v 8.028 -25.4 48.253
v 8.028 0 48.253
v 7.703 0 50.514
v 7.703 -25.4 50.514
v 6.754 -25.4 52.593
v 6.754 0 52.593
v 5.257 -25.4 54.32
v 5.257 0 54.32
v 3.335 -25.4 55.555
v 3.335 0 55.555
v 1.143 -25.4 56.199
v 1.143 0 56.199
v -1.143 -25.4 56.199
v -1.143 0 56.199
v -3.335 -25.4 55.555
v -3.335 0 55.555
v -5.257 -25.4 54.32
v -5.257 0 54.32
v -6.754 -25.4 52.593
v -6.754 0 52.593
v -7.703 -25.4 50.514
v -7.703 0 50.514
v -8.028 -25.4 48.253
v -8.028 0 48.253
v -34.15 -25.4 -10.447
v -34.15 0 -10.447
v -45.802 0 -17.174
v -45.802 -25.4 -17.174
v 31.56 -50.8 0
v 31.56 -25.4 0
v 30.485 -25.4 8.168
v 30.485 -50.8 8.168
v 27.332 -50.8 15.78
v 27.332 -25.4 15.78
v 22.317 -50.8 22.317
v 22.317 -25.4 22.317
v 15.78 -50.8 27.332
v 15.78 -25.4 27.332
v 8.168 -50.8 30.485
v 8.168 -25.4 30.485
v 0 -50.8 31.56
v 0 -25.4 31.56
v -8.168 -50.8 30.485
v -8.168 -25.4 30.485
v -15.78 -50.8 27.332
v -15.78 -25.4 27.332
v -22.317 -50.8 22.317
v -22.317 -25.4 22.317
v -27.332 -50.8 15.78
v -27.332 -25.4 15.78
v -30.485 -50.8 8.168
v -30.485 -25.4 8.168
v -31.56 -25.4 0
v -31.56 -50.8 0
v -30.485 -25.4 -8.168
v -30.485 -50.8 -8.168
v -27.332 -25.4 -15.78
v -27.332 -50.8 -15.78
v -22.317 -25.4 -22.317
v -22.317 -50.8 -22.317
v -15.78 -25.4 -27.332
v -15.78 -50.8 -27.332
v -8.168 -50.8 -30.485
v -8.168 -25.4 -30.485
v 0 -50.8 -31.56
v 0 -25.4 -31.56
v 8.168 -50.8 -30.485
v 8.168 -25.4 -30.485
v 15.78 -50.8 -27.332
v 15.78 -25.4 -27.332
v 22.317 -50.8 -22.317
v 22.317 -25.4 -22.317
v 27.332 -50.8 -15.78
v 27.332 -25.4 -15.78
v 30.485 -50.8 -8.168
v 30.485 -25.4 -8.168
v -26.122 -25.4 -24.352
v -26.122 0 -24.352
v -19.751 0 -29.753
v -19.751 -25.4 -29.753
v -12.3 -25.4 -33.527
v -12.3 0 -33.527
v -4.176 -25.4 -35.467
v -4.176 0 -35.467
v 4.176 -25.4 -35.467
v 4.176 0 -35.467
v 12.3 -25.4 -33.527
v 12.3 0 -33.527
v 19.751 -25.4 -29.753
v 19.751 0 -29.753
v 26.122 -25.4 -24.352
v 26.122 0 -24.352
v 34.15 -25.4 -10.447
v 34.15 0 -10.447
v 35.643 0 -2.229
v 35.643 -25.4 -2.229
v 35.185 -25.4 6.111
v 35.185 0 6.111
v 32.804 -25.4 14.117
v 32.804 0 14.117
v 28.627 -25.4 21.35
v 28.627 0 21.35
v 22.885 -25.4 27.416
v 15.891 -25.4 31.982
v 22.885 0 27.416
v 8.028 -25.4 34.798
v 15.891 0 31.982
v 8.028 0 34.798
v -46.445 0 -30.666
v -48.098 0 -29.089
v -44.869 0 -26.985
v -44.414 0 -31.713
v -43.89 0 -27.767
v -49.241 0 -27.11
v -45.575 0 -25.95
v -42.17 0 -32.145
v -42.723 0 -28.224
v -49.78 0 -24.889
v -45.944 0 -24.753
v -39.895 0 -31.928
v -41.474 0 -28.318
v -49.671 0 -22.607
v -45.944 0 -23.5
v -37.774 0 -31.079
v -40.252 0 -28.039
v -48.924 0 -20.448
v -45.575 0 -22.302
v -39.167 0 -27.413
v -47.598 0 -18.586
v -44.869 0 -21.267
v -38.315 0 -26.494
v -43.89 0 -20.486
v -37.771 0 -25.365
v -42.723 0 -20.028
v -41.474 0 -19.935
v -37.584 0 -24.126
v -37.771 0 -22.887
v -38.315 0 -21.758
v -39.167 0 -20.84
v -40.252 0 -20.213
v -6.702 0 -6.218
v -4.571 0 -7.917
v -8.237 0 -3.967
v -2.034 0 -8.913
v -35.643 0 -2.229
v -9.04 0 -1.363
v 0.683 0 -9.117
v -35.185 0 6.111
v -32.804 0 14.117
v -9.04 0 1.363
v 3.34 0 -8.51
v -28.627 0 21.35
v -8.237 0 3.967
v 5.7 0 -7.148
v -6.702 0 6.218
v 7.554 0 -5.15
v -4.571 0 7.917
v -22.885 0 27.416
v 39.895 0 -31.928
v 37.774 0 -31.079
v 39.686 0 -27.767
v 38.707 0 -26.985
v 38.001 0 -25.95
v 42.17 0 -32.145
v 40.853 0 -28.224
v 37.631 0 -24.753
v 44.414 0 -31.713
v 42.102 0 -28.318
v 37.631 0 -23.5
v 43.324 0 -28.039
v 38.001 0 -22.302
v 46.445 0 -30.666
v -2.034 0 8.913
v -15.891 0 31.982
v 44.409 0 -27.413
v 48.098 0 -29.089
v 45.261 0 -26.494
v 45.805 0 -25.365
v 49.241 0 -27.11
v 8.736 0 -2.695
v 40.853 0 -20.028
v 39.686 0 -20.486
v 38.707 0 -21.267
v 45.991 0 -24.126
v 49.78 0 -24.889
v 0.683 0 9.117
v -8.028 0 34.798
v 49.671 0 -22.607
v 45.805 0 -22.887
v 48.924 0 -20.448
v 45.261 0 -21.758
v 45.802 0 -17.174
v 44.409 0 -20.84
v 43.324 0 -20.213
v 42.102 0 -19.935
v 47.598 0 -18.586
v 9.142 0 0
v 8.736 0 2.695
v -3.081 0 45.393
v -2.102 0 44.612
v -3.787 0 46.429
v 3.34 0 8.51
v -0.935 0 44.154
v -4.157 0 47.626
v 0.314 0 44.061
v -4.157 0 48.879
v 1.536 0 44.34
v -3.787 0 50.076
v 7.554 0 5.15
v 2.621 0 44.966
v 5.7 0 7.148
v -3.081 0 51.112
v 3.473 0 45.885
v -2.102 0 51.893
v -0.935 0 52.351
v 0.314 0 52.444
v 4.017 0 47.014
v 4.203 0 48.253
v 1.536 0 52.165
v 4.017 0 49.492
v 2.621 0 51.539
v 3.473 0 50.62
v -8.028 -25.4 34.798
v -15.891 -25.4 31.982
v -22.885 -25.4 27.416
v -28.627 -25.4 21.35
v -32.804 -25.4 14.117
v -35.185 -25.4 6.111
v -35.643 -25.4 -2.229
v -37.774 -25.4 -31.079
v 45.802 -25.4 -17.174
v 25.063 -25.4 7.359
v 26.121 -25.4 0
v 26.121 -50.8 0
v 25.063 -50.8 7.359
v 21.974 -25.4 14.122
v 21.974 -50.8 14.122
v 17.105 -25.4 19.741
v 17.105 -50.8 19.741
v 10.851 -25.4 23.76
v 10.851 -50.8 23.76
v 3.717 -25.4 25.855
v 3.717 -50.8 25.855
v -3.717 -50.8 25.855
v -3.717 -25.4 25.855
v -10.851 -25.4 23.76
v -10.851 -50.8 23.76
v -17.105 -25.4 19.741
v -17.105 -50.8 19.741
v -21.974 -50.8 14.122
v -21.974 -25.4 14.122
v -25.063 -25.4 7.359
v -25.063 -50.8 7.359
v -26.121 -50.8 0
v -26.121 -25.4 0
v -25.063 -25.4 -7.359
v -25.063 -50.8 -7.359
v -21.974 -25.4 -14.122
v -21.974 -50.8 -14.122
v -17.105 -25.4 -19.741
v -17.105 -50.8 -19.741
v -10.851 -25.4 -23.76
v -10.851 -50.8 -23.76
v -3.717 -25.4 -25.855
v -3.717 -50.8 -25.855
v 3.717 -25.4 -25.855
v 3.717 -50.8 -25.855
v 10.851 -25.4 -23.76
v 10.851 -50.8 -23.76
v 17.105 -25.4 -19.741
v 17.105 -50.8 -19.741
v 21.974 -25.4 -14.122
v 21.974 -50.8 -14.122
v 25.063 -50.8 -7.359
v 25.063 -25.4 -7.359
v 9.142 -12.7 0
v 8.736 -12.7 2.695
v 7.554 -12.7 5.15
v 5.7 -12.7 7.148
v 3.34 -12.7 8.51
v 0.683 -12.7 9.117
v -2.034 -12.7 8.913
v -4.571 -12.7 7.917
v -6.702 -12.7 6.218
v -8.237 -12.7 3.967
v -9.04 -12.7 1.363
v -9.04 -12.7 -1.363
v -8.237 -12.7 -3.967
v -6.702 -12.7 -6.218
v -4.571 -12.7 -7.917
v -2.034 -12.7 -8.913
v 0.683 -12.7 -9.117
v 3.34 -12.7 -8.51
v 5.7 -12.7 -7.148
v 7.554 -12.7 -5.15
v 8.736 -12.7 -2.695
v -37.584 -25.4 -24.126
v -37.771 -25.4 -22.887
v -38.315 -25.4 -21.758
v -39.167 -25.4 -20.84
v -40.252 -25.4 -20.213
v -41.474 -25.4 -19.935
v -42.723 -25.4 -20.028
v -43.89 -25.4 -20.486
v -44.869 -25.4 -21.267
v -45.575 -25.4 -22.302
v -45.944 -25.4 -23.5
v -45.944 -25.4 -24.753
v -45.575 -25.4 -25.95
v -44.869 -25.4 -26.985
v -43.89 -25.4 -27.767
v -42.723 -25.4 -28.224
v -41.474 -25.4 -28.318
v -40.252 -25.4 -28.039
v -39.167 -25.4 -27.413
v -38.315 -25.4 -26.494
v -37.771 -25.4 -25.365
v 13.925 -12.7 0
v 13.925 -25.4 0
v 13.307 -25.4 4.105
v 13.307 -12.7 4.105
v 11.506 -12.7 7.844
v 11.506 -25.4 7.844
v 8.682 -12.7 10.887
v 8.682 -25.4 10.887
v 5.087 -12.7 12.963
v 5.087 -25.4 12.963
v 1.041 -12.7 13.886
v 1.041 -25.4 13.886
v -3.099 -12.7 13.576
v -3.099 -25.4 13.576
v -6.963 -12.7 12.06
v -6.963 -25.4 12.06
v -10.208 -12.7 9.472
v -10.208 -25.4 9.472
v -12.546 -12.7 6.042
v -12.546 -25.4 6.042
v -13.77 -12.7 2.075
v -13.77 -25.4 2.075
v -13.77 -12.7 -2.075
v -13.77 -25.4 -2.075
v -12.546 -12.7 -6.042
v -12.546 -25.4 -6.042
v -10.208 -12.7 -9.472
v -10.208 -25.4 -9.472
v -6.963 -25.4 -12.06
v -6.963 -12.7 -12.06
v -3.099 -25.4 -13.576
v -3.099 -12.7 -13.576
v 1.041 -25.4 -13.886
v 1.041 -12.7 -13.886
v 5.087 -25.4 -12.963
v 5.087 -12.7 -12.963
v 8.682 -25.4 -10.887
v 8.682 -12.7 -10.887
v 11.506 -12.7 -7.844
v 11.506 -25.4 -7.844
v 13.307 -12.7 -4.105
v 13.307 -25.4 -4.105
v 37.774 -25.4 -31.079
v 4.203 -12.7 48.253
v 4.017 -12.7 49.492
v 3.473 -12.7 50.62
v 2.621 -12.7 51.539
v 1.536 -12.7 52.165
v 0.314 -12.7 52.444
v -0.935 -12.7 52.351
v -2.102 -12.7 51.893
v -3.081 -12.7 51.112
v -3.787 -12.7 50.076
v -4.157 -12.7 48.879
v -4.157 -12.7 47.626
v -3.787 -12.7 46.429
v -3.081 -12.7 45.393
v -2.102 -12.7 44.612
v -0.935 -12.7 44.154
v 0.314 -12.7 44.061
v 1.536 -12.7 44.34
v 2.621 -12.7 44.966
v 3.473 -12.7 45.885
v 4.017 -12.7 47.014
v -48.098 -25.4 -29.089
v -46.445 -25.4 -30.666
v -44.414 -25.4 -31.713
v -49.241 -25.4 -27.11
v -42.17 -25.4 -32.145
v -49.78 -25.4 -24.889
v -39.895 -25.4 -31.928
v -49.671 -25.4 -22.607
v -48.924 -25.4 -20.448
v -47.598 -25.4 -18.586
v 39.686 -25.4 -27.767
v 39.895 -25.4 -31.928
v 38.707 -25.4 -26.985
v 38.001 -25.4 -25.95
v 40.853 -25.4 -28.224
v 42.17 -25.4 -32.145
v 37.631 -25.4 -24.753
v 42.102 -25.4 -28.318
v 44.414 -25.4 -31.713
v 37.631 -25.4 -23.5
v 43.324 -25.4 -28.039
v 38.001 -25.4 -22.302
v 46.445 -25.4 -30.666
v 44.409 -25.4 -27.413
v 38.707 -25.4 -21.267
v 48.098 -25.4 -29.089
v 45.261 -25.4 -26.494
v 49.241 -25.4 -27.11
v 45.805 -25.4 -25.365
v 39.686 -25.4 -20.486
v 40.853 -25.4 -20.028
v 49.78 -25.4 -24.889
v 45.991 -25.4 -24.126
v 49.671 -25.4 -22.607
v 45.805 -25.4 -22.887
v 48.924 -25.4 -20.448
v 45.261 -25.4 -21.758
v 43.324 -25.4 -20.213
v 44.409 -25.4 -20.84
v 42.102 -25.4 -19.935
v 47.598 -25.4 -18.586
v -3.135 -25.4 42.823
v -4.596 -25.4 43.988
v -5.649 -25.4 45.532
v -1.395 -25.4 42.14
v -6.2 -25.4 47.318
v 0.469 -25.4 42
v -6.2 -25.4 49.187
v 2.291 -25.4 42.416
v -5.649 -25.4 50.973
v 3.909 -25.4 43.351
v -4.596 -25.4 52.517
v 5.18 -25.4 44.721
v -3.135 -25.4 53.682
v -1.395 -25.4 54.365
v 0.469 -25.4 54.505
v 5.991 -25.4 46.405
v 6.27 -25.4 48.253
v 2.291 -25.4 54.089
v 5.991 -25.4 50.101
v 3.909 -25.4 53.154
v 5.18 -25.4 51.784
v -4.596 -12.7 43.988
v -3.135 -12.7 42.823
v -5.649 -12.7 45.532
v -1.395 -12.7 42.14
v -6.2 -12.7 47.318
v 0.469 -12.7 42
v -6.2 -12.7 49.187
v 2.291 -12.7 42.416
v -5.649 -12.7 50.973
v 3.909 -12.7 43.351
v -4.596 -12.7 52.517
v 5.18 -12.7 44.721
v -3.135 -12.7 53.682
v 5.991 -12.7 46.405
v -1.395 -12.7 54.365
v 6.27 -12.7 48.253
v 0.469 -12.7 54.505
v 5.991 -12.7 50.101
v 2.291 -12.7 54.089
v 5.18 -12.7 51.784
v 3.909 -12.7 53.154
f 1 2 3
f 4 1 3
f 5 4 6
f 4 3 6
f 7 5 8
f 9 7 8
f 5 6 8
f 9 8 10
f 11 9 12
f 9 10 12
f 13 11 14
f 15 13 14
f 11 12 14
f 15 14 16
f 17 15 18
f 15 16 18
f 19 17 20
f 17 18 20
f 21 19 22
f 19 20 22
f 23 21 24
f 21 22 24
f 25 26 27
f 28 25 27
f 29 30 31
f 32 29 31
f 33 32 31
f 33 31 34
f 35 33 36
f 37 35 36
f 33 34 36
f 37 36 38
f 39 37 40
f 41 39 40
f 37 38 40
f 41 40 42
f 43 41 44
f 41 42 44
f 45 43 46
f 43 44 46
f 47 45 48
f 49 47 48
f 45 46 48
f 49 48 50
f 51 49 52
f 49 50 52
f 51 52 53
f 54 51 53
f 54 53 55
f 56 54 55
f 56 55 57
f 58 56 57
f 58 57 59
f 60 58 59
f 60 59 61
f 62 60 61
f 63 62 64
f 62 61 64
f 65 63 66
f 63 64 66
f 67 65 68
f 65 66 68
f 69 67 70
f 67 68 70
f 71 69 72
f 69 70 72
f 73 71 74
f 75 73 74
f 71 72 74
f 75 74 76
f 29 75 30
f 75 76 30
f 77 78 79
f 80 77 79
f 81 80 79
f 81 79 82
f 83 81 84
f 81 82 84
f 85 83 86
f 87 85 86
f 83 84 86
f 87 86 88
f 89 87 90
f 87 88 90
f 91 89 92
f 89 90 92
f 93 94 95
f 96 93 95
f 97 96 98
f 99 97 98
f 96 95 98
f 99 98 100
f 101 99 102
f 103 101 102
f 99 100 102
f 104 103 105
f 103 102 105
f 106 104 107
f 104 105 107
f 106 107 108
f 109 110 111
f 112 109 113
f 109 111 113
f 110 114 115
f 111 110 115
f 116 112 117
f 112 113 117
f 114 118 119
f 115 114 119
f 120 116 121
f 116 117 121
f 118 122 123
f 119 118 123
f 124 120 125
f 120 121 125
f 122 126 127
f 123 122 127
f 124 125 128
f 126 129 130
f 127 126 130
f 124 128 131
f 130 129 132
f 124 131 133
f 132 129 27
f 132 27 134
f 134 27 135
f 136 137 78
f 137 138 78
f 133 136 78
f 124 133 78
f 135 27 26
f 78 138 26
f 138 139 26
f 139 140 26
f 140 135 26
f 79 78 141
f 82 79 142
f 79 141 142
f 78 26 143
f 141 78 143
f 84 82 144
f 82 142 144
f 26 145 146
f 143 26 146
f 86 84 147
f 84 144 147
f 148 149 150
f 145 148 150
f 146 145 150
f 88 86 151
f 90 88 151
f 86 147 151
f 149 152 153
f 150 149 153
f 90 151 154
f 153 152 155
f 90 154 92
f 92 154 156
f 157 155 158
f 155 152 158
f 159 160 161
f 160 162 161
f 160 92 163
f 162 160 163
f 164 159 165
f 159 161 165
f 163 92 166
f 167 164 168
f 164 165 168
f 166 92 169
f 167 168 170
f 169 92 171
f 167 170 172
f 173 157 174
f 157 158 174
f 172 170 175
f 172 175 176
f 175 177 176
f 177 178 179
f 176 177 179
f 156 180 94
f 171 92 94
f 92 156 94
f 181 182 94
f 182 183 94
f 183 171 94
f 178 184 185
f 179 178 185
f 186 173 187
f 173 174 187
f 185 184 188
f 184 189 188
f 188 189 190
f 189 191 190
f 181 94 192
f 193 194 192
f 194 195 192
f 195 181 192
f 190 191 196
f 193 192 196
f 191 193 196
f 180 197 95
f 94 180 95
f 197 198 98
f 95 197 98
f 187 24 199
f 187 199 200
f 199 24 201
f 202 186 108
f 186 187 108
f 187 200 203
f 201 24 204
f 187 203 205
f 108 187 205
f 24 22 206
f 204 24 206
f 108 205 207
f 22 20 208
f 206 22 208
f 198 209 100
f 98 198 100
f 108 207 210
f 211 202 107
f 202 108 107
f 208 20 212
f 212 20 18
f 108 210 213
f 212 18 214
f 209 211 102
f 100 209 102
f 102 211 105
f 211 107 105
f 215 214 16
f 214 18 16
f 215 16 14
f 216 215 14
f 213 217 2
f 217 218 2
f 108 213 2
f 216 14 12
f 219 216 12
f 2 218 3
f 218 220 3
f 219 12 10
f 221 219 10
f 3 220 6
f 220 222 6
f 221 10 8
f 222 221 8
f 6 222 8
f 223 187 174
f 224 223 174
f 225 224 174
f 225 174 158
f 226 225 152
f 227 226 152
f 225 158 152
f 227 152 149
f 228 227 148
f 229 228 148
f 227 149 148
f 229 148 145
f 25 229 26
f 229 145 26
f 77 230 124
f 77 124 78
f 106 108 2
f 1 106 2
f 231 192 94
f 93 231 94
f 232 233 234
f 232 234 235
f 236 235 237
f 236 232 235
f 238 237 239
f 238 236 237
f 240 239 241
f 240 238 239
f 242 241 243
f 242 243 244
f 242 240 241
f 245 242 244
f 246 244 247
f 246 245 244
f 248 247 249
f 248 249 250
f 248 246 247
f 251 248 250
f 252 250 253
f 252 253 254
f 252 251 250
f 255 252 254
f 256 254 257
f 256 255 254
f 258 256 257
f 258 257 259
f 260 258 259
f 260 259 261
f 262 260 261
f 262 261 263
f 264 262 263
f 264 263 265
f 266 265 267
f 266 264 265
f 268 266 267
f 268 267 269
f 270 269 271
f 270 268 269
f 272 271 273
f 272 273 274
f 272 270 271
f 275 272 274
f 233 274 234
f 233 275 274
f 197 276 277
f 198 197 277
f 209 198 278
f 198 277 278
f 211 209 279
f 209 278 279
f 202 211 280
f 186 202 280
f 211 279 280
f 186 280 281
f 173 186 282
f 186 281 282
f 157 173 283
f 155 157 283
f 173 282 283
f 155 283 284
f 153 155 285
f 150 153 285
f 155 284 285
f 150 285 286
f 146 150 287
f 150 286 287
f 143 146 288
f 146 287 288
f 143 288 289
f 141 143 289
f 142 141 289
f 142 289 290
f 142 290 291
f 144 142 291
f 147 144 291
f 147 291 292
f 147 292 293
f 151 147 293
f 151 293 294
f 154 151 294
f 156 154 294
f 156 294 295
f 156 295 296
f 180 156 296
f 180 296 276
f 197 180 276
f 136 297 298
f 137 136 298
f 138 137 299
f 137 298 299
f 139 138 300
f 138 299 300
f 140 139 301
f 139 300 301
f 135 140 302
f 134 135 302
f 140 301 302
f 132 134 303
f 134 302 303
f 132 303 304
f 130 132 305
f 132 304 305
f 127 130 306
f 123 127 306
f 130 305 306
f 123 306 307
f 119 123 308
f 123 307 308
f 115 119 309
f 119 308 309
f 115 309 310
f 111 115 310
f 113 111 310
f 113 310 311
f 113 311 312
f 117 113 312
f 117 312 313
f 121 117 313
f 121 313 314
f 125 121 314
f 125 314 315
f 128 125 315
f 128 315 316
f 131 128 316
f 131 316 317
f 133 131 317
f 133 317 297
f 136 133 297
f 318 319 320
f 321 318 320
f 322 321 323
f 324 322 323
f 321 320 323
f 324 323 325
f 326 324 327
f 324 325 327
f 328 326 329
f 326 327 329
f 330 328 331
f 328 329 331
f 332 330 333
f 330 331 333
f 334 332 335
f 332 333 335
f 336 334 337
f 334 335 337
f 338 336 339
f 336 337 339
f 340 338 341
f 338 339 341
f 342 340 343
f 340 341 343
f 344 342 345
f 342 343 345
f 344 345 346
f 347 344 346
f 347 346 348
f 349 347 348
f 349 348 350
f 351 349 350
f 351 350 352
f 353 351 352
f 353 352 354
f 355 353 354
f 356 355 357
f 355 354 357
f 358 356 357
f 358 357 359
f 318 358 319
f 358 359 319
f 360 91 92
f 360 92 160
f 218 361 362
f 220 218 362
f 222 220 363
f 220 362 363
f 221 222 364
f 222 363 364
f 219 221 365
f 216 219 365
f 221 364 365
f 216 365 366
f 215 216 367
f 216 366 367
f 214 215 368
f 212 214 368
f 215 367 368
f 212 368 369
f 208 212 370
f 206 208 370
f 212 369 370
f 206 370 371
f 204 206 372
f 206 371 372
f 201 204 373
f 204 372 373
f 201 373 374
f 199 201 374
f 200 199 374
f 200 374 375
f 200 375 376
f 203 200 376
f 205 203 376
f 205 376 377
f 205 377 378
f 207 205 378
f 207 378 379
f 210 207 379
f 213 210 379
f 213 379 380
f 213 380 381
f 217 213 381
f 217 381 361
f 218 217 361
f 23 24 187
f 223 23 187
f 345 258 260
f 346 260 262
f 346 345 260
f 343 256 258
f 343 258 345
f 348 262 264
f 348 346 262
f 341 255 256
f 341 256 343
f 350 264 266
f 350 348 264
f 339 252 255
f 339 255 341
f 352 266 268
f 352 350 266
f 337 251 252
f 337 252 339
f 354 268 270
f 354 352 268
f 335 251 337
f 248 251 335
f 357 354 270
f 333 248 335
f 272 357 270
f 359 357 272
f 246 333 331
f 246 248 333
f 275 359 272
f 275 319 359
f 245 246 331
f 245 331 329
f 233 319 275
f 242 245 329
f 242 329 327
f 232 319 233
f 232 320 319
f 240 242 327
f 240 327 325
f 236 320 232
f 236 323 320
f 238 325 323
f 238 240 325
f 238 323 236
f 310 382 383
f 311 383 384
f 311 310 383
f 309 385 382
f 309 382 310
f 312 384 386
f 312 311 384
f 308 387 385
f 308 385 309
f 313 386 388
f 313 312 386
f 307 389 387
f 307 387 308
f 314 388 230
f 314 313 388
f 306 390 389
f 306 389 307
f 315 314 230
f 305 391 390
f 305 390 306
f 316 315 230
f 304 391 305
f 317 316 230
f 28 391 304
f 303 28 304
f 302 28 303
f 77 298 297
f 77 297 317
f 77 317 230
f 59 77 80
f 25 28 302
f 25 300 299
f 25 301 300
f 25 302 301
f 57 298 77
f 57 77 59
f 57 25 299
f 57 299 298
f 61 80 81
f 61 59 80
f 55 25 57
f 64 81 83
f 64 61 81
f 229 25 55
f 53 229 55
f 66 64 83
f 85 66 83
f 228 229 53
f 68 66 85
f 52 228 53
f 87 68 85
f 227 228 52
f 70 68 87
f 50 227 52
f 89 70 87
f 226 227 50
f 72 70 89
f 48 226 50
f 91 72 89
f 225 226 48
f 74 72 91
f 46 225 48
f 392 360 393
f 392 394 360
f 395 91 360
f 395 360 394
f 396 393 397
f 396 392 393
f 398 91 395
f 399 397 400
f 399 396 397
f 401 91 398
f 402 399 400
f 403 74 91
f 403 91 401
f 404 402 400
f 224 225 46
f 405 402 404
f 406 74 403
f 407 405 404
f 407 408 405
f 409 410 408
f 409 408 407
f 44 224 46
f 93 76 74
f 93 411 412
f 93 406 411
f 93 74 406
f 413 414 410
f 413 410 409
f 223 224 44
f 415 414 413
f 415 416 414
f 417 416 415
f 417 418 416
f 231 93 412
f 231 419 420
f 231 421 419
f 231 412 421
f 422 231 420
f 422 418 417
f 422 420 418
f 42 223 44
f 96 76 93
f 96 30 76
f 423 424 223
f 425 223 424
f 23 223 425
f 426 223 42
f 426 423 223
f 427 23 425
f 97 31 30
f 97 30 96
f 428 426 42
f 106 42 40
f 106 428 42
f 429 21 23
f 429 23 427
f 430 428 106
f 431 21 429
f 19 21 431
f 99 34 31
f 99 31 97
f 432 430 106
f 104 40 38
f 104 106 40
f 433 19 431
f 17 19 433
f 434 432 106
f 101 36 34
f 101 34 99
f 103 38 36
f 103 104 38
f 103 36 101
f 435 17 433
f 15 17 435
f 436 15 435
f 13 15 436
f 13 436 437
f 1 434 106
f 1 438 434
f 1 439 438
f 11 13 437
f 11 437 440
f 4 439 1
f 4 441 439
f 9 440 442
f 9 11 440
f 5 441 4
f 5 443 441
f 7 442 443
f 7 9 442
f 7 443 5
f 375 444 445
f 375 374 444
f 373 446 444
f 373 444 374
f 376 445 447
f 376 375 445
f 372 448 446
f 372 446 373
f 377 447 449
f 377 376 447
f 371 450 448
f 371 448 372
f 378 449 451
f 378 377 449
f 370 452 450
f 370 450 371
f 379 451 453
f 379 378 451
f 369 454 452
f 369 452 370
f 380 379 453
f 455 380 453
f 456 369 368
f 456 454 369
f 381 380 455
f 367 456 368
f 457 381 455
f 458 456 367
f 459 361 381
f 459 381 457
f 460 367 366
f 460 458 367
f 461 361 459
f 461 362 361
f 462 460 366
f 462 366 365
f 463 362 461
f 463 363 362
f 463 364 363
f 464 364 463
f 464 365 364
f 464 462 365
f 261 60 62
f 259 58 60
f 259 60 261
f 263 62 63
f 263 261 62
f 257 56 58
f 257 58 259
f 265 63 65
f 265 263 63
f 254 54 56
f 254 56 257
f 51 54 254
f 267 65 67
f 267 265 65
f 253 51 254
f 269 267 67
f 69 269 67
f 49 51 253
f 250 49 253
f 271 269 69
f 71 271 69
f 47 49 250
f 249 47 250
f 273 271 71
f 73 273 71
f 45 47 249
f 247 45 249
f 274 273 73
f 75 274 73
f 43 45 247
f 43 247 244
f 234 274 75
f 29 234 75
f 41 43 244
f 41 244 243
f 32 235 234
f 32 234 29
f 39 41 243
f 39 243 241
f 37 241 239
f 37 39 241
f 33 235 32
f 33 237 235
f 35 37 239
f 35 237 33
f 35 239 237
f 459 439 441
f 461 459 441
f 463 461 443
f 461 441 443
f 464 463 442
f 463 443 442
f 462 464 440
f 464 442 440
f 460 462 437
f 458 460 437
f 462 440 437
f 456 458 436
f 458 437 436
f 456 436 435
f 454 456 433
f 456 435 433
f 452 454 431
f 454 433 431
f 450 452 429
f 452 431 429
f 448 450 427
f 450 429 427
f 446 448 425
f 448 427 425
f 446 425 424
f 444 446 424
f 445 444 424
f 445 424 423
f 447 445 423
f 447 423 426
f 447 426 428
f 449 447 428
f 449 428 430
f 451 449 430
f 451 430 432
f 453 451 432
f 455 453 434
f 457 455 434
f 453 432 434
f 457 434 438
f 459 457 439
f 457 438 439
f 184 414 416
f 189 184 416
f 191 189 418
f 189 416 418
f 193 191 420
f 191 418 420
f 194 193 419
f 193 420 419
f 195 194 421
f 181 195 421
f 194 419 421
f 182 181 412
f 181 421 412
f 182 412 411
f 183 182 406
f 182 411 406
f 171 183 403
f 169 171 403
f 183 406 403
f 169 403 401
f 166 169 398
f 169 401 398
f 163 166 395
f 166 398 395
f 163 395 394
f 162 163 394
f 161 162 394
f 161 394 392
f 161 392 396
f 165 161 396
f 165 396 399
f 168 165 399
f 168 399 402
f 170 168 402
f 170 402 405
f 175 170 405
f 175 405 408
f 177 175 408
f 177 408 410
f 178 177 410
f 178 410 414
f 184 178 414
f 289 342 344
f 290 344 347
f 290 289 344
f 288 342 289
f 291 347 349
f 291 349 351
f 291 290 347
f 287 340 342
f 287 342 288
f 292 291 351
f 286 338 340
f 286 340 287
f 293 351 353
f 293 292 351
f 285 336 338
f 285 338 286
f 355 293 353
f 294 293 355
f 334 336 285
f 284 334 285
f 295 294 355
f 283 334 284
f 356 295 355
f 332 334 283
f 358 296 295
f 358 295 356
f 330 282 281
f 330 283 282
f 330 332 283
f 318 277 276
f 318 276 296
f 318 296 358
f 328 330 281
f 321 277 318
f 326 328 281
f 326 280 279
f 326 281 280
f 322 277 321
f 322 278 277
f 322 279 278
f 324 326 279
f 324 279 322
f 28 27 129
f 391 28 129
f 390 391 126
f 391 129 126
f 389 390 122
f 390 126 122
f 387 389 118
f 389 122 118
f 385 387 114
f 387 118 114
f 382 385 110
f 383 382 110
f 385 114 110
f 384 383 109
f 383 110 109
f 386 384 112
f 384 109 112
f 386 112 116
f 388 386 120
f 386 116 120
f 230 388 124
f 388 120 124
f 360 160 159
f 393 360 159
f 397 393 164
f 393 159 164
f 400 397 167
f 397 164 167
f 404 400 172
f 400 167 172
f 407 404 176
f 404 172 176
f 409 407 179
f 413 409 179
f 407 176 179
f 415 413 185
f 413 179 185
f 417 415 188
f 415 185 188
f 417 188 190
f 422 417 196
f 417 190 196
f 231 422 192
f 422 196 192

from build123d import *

# Parameters (mm, degrees)
F1_DEPTH  = 25.4
F2_R      = 4.203451
F3_DEPTH  = 25.401
F4_R      = 6.269699
F4_R_2    = 4.203451
F6_DEPTH  = 12.7
F7_R      = 9.142081
F8_DEPTH  = 25.401
F9_R      = 13.925159
F10_DEPTH = 12.7
F11_R     = 31.560362
F11_R_2   = 26.120651
F12_DEPTH = 25.4


with BuildPart() as f1:
    # F0 (on Front) → F1 (new body)
    with BuildSketch(Plane.XZ):
        with BuildLine():
            Line((-8.028061, 48.252545), (-8.028061, 34.79823))
            ThreePointArc((-8.028061, 34.79823), (-30.927737, 17.856137), (-34.150182, -10.44661))
            ThreePointArc((-34.150182, -10.44661), (-30.927737, -17.856137), (-26.122121, -24.35162))
            ThreePointArc((-26.122121, -24.35162), (0, -35.712275), (26.122121, -24.35162))
            ThreePointArc((26.122121, -24.35162), (30.927737, -17.856137), (34.150182, -10.44661))
            ThreePointArc((34.150182, -10.44661), (30.927737, 17.856137), (8.028061, 34.79823))
            Line((8.028061, 34.79823), (8.028061, 48.252545))
            ThreePointArc((8.028061, 48.252545), (0, 56.280606), (-8.028061, 48.252545))
        make_face()
        with BuildLine():
            ThreePointArc((-26.122121, -24.35162), (-30.927737, -17.856137), (-34.150182, -10.44661))
            Line((-34.150182, -10.44661), (-45.801961, -17.173768))
            ThreePointArc((-45.801961, -17.173768), (-48.740435, -28.140303), (-37.773899, -31.078778))
            Line((-37.773899, -31.078778), (-26.122121, -24.35162))
        make_face()
        with BuildLine():
            ThreePointArc((34.150182, -10.44661), (30.927737, -17.856137), (26.122121, -24.35162))
            Line((26.122121, -24.35162), (37.773899, -31.078778))
            ThreePointArc((37.773899, -31.078778), (48.740435, -28.140303), (45.801961, -17.173768))
            Line((45.801961, -17.173768), (34.150182, -10.44661))
        make_face()
    extrude(amount=F1_DEPTH)

    # F2 (on face) → F3 (cut, through all)
    with BuildSketch(Plane.XZ.offset(25.4)):
        with Locations((0, 48.252545)):
            Circle(F2_R)
        with Locations((-41.78793, -24.126273)):
            Circle(F2_R)
        with Locations((41.78793, -24.126273)):
            Circle(F2_R)
    extrude(amount=-F3_DEPTH, mode=Mode.SUBTRACT)

    # F4 (on face) → F6 (cut)
    with BuildSketch(Plane.XZ.offset(25.4)):
        with Locations((0, 48.252545)):
            Circle(F4_R)
        with Locations((0, 48.252545)):
            Circle(F4_R_2, mode=Mode.SUBTRACT)
    extrude(amount=-F6_DEPTH, mode=Mode.SUBTRACT)

    # F7 (on face) → F8 (cut, through all)
    with BuildSketch(Plane.XZ.offset(25.4)):
        Circle(F7_R)
    extrude(amount=-F8_DEPTH, mode=Mode.SUBTRACT)

    # F9 (on face) → F10 (cut)
    with BuildSketch(Plane.XZ.offset(25.4)):
        Circle(F9_R)
    extrude(amount=-F10_DEPTH, mode=Mode.SUBTRACT)

    # F11 (on face) → F12 (join)
    with BuildSketch(Plane.XZ.offset(25.4)):
        Circle(F11_R)
        Circle(F11_R_2, mode=Mode.SUBTRACT)
    extrude(amount=F12_DEPTH)


solid = f1.part
